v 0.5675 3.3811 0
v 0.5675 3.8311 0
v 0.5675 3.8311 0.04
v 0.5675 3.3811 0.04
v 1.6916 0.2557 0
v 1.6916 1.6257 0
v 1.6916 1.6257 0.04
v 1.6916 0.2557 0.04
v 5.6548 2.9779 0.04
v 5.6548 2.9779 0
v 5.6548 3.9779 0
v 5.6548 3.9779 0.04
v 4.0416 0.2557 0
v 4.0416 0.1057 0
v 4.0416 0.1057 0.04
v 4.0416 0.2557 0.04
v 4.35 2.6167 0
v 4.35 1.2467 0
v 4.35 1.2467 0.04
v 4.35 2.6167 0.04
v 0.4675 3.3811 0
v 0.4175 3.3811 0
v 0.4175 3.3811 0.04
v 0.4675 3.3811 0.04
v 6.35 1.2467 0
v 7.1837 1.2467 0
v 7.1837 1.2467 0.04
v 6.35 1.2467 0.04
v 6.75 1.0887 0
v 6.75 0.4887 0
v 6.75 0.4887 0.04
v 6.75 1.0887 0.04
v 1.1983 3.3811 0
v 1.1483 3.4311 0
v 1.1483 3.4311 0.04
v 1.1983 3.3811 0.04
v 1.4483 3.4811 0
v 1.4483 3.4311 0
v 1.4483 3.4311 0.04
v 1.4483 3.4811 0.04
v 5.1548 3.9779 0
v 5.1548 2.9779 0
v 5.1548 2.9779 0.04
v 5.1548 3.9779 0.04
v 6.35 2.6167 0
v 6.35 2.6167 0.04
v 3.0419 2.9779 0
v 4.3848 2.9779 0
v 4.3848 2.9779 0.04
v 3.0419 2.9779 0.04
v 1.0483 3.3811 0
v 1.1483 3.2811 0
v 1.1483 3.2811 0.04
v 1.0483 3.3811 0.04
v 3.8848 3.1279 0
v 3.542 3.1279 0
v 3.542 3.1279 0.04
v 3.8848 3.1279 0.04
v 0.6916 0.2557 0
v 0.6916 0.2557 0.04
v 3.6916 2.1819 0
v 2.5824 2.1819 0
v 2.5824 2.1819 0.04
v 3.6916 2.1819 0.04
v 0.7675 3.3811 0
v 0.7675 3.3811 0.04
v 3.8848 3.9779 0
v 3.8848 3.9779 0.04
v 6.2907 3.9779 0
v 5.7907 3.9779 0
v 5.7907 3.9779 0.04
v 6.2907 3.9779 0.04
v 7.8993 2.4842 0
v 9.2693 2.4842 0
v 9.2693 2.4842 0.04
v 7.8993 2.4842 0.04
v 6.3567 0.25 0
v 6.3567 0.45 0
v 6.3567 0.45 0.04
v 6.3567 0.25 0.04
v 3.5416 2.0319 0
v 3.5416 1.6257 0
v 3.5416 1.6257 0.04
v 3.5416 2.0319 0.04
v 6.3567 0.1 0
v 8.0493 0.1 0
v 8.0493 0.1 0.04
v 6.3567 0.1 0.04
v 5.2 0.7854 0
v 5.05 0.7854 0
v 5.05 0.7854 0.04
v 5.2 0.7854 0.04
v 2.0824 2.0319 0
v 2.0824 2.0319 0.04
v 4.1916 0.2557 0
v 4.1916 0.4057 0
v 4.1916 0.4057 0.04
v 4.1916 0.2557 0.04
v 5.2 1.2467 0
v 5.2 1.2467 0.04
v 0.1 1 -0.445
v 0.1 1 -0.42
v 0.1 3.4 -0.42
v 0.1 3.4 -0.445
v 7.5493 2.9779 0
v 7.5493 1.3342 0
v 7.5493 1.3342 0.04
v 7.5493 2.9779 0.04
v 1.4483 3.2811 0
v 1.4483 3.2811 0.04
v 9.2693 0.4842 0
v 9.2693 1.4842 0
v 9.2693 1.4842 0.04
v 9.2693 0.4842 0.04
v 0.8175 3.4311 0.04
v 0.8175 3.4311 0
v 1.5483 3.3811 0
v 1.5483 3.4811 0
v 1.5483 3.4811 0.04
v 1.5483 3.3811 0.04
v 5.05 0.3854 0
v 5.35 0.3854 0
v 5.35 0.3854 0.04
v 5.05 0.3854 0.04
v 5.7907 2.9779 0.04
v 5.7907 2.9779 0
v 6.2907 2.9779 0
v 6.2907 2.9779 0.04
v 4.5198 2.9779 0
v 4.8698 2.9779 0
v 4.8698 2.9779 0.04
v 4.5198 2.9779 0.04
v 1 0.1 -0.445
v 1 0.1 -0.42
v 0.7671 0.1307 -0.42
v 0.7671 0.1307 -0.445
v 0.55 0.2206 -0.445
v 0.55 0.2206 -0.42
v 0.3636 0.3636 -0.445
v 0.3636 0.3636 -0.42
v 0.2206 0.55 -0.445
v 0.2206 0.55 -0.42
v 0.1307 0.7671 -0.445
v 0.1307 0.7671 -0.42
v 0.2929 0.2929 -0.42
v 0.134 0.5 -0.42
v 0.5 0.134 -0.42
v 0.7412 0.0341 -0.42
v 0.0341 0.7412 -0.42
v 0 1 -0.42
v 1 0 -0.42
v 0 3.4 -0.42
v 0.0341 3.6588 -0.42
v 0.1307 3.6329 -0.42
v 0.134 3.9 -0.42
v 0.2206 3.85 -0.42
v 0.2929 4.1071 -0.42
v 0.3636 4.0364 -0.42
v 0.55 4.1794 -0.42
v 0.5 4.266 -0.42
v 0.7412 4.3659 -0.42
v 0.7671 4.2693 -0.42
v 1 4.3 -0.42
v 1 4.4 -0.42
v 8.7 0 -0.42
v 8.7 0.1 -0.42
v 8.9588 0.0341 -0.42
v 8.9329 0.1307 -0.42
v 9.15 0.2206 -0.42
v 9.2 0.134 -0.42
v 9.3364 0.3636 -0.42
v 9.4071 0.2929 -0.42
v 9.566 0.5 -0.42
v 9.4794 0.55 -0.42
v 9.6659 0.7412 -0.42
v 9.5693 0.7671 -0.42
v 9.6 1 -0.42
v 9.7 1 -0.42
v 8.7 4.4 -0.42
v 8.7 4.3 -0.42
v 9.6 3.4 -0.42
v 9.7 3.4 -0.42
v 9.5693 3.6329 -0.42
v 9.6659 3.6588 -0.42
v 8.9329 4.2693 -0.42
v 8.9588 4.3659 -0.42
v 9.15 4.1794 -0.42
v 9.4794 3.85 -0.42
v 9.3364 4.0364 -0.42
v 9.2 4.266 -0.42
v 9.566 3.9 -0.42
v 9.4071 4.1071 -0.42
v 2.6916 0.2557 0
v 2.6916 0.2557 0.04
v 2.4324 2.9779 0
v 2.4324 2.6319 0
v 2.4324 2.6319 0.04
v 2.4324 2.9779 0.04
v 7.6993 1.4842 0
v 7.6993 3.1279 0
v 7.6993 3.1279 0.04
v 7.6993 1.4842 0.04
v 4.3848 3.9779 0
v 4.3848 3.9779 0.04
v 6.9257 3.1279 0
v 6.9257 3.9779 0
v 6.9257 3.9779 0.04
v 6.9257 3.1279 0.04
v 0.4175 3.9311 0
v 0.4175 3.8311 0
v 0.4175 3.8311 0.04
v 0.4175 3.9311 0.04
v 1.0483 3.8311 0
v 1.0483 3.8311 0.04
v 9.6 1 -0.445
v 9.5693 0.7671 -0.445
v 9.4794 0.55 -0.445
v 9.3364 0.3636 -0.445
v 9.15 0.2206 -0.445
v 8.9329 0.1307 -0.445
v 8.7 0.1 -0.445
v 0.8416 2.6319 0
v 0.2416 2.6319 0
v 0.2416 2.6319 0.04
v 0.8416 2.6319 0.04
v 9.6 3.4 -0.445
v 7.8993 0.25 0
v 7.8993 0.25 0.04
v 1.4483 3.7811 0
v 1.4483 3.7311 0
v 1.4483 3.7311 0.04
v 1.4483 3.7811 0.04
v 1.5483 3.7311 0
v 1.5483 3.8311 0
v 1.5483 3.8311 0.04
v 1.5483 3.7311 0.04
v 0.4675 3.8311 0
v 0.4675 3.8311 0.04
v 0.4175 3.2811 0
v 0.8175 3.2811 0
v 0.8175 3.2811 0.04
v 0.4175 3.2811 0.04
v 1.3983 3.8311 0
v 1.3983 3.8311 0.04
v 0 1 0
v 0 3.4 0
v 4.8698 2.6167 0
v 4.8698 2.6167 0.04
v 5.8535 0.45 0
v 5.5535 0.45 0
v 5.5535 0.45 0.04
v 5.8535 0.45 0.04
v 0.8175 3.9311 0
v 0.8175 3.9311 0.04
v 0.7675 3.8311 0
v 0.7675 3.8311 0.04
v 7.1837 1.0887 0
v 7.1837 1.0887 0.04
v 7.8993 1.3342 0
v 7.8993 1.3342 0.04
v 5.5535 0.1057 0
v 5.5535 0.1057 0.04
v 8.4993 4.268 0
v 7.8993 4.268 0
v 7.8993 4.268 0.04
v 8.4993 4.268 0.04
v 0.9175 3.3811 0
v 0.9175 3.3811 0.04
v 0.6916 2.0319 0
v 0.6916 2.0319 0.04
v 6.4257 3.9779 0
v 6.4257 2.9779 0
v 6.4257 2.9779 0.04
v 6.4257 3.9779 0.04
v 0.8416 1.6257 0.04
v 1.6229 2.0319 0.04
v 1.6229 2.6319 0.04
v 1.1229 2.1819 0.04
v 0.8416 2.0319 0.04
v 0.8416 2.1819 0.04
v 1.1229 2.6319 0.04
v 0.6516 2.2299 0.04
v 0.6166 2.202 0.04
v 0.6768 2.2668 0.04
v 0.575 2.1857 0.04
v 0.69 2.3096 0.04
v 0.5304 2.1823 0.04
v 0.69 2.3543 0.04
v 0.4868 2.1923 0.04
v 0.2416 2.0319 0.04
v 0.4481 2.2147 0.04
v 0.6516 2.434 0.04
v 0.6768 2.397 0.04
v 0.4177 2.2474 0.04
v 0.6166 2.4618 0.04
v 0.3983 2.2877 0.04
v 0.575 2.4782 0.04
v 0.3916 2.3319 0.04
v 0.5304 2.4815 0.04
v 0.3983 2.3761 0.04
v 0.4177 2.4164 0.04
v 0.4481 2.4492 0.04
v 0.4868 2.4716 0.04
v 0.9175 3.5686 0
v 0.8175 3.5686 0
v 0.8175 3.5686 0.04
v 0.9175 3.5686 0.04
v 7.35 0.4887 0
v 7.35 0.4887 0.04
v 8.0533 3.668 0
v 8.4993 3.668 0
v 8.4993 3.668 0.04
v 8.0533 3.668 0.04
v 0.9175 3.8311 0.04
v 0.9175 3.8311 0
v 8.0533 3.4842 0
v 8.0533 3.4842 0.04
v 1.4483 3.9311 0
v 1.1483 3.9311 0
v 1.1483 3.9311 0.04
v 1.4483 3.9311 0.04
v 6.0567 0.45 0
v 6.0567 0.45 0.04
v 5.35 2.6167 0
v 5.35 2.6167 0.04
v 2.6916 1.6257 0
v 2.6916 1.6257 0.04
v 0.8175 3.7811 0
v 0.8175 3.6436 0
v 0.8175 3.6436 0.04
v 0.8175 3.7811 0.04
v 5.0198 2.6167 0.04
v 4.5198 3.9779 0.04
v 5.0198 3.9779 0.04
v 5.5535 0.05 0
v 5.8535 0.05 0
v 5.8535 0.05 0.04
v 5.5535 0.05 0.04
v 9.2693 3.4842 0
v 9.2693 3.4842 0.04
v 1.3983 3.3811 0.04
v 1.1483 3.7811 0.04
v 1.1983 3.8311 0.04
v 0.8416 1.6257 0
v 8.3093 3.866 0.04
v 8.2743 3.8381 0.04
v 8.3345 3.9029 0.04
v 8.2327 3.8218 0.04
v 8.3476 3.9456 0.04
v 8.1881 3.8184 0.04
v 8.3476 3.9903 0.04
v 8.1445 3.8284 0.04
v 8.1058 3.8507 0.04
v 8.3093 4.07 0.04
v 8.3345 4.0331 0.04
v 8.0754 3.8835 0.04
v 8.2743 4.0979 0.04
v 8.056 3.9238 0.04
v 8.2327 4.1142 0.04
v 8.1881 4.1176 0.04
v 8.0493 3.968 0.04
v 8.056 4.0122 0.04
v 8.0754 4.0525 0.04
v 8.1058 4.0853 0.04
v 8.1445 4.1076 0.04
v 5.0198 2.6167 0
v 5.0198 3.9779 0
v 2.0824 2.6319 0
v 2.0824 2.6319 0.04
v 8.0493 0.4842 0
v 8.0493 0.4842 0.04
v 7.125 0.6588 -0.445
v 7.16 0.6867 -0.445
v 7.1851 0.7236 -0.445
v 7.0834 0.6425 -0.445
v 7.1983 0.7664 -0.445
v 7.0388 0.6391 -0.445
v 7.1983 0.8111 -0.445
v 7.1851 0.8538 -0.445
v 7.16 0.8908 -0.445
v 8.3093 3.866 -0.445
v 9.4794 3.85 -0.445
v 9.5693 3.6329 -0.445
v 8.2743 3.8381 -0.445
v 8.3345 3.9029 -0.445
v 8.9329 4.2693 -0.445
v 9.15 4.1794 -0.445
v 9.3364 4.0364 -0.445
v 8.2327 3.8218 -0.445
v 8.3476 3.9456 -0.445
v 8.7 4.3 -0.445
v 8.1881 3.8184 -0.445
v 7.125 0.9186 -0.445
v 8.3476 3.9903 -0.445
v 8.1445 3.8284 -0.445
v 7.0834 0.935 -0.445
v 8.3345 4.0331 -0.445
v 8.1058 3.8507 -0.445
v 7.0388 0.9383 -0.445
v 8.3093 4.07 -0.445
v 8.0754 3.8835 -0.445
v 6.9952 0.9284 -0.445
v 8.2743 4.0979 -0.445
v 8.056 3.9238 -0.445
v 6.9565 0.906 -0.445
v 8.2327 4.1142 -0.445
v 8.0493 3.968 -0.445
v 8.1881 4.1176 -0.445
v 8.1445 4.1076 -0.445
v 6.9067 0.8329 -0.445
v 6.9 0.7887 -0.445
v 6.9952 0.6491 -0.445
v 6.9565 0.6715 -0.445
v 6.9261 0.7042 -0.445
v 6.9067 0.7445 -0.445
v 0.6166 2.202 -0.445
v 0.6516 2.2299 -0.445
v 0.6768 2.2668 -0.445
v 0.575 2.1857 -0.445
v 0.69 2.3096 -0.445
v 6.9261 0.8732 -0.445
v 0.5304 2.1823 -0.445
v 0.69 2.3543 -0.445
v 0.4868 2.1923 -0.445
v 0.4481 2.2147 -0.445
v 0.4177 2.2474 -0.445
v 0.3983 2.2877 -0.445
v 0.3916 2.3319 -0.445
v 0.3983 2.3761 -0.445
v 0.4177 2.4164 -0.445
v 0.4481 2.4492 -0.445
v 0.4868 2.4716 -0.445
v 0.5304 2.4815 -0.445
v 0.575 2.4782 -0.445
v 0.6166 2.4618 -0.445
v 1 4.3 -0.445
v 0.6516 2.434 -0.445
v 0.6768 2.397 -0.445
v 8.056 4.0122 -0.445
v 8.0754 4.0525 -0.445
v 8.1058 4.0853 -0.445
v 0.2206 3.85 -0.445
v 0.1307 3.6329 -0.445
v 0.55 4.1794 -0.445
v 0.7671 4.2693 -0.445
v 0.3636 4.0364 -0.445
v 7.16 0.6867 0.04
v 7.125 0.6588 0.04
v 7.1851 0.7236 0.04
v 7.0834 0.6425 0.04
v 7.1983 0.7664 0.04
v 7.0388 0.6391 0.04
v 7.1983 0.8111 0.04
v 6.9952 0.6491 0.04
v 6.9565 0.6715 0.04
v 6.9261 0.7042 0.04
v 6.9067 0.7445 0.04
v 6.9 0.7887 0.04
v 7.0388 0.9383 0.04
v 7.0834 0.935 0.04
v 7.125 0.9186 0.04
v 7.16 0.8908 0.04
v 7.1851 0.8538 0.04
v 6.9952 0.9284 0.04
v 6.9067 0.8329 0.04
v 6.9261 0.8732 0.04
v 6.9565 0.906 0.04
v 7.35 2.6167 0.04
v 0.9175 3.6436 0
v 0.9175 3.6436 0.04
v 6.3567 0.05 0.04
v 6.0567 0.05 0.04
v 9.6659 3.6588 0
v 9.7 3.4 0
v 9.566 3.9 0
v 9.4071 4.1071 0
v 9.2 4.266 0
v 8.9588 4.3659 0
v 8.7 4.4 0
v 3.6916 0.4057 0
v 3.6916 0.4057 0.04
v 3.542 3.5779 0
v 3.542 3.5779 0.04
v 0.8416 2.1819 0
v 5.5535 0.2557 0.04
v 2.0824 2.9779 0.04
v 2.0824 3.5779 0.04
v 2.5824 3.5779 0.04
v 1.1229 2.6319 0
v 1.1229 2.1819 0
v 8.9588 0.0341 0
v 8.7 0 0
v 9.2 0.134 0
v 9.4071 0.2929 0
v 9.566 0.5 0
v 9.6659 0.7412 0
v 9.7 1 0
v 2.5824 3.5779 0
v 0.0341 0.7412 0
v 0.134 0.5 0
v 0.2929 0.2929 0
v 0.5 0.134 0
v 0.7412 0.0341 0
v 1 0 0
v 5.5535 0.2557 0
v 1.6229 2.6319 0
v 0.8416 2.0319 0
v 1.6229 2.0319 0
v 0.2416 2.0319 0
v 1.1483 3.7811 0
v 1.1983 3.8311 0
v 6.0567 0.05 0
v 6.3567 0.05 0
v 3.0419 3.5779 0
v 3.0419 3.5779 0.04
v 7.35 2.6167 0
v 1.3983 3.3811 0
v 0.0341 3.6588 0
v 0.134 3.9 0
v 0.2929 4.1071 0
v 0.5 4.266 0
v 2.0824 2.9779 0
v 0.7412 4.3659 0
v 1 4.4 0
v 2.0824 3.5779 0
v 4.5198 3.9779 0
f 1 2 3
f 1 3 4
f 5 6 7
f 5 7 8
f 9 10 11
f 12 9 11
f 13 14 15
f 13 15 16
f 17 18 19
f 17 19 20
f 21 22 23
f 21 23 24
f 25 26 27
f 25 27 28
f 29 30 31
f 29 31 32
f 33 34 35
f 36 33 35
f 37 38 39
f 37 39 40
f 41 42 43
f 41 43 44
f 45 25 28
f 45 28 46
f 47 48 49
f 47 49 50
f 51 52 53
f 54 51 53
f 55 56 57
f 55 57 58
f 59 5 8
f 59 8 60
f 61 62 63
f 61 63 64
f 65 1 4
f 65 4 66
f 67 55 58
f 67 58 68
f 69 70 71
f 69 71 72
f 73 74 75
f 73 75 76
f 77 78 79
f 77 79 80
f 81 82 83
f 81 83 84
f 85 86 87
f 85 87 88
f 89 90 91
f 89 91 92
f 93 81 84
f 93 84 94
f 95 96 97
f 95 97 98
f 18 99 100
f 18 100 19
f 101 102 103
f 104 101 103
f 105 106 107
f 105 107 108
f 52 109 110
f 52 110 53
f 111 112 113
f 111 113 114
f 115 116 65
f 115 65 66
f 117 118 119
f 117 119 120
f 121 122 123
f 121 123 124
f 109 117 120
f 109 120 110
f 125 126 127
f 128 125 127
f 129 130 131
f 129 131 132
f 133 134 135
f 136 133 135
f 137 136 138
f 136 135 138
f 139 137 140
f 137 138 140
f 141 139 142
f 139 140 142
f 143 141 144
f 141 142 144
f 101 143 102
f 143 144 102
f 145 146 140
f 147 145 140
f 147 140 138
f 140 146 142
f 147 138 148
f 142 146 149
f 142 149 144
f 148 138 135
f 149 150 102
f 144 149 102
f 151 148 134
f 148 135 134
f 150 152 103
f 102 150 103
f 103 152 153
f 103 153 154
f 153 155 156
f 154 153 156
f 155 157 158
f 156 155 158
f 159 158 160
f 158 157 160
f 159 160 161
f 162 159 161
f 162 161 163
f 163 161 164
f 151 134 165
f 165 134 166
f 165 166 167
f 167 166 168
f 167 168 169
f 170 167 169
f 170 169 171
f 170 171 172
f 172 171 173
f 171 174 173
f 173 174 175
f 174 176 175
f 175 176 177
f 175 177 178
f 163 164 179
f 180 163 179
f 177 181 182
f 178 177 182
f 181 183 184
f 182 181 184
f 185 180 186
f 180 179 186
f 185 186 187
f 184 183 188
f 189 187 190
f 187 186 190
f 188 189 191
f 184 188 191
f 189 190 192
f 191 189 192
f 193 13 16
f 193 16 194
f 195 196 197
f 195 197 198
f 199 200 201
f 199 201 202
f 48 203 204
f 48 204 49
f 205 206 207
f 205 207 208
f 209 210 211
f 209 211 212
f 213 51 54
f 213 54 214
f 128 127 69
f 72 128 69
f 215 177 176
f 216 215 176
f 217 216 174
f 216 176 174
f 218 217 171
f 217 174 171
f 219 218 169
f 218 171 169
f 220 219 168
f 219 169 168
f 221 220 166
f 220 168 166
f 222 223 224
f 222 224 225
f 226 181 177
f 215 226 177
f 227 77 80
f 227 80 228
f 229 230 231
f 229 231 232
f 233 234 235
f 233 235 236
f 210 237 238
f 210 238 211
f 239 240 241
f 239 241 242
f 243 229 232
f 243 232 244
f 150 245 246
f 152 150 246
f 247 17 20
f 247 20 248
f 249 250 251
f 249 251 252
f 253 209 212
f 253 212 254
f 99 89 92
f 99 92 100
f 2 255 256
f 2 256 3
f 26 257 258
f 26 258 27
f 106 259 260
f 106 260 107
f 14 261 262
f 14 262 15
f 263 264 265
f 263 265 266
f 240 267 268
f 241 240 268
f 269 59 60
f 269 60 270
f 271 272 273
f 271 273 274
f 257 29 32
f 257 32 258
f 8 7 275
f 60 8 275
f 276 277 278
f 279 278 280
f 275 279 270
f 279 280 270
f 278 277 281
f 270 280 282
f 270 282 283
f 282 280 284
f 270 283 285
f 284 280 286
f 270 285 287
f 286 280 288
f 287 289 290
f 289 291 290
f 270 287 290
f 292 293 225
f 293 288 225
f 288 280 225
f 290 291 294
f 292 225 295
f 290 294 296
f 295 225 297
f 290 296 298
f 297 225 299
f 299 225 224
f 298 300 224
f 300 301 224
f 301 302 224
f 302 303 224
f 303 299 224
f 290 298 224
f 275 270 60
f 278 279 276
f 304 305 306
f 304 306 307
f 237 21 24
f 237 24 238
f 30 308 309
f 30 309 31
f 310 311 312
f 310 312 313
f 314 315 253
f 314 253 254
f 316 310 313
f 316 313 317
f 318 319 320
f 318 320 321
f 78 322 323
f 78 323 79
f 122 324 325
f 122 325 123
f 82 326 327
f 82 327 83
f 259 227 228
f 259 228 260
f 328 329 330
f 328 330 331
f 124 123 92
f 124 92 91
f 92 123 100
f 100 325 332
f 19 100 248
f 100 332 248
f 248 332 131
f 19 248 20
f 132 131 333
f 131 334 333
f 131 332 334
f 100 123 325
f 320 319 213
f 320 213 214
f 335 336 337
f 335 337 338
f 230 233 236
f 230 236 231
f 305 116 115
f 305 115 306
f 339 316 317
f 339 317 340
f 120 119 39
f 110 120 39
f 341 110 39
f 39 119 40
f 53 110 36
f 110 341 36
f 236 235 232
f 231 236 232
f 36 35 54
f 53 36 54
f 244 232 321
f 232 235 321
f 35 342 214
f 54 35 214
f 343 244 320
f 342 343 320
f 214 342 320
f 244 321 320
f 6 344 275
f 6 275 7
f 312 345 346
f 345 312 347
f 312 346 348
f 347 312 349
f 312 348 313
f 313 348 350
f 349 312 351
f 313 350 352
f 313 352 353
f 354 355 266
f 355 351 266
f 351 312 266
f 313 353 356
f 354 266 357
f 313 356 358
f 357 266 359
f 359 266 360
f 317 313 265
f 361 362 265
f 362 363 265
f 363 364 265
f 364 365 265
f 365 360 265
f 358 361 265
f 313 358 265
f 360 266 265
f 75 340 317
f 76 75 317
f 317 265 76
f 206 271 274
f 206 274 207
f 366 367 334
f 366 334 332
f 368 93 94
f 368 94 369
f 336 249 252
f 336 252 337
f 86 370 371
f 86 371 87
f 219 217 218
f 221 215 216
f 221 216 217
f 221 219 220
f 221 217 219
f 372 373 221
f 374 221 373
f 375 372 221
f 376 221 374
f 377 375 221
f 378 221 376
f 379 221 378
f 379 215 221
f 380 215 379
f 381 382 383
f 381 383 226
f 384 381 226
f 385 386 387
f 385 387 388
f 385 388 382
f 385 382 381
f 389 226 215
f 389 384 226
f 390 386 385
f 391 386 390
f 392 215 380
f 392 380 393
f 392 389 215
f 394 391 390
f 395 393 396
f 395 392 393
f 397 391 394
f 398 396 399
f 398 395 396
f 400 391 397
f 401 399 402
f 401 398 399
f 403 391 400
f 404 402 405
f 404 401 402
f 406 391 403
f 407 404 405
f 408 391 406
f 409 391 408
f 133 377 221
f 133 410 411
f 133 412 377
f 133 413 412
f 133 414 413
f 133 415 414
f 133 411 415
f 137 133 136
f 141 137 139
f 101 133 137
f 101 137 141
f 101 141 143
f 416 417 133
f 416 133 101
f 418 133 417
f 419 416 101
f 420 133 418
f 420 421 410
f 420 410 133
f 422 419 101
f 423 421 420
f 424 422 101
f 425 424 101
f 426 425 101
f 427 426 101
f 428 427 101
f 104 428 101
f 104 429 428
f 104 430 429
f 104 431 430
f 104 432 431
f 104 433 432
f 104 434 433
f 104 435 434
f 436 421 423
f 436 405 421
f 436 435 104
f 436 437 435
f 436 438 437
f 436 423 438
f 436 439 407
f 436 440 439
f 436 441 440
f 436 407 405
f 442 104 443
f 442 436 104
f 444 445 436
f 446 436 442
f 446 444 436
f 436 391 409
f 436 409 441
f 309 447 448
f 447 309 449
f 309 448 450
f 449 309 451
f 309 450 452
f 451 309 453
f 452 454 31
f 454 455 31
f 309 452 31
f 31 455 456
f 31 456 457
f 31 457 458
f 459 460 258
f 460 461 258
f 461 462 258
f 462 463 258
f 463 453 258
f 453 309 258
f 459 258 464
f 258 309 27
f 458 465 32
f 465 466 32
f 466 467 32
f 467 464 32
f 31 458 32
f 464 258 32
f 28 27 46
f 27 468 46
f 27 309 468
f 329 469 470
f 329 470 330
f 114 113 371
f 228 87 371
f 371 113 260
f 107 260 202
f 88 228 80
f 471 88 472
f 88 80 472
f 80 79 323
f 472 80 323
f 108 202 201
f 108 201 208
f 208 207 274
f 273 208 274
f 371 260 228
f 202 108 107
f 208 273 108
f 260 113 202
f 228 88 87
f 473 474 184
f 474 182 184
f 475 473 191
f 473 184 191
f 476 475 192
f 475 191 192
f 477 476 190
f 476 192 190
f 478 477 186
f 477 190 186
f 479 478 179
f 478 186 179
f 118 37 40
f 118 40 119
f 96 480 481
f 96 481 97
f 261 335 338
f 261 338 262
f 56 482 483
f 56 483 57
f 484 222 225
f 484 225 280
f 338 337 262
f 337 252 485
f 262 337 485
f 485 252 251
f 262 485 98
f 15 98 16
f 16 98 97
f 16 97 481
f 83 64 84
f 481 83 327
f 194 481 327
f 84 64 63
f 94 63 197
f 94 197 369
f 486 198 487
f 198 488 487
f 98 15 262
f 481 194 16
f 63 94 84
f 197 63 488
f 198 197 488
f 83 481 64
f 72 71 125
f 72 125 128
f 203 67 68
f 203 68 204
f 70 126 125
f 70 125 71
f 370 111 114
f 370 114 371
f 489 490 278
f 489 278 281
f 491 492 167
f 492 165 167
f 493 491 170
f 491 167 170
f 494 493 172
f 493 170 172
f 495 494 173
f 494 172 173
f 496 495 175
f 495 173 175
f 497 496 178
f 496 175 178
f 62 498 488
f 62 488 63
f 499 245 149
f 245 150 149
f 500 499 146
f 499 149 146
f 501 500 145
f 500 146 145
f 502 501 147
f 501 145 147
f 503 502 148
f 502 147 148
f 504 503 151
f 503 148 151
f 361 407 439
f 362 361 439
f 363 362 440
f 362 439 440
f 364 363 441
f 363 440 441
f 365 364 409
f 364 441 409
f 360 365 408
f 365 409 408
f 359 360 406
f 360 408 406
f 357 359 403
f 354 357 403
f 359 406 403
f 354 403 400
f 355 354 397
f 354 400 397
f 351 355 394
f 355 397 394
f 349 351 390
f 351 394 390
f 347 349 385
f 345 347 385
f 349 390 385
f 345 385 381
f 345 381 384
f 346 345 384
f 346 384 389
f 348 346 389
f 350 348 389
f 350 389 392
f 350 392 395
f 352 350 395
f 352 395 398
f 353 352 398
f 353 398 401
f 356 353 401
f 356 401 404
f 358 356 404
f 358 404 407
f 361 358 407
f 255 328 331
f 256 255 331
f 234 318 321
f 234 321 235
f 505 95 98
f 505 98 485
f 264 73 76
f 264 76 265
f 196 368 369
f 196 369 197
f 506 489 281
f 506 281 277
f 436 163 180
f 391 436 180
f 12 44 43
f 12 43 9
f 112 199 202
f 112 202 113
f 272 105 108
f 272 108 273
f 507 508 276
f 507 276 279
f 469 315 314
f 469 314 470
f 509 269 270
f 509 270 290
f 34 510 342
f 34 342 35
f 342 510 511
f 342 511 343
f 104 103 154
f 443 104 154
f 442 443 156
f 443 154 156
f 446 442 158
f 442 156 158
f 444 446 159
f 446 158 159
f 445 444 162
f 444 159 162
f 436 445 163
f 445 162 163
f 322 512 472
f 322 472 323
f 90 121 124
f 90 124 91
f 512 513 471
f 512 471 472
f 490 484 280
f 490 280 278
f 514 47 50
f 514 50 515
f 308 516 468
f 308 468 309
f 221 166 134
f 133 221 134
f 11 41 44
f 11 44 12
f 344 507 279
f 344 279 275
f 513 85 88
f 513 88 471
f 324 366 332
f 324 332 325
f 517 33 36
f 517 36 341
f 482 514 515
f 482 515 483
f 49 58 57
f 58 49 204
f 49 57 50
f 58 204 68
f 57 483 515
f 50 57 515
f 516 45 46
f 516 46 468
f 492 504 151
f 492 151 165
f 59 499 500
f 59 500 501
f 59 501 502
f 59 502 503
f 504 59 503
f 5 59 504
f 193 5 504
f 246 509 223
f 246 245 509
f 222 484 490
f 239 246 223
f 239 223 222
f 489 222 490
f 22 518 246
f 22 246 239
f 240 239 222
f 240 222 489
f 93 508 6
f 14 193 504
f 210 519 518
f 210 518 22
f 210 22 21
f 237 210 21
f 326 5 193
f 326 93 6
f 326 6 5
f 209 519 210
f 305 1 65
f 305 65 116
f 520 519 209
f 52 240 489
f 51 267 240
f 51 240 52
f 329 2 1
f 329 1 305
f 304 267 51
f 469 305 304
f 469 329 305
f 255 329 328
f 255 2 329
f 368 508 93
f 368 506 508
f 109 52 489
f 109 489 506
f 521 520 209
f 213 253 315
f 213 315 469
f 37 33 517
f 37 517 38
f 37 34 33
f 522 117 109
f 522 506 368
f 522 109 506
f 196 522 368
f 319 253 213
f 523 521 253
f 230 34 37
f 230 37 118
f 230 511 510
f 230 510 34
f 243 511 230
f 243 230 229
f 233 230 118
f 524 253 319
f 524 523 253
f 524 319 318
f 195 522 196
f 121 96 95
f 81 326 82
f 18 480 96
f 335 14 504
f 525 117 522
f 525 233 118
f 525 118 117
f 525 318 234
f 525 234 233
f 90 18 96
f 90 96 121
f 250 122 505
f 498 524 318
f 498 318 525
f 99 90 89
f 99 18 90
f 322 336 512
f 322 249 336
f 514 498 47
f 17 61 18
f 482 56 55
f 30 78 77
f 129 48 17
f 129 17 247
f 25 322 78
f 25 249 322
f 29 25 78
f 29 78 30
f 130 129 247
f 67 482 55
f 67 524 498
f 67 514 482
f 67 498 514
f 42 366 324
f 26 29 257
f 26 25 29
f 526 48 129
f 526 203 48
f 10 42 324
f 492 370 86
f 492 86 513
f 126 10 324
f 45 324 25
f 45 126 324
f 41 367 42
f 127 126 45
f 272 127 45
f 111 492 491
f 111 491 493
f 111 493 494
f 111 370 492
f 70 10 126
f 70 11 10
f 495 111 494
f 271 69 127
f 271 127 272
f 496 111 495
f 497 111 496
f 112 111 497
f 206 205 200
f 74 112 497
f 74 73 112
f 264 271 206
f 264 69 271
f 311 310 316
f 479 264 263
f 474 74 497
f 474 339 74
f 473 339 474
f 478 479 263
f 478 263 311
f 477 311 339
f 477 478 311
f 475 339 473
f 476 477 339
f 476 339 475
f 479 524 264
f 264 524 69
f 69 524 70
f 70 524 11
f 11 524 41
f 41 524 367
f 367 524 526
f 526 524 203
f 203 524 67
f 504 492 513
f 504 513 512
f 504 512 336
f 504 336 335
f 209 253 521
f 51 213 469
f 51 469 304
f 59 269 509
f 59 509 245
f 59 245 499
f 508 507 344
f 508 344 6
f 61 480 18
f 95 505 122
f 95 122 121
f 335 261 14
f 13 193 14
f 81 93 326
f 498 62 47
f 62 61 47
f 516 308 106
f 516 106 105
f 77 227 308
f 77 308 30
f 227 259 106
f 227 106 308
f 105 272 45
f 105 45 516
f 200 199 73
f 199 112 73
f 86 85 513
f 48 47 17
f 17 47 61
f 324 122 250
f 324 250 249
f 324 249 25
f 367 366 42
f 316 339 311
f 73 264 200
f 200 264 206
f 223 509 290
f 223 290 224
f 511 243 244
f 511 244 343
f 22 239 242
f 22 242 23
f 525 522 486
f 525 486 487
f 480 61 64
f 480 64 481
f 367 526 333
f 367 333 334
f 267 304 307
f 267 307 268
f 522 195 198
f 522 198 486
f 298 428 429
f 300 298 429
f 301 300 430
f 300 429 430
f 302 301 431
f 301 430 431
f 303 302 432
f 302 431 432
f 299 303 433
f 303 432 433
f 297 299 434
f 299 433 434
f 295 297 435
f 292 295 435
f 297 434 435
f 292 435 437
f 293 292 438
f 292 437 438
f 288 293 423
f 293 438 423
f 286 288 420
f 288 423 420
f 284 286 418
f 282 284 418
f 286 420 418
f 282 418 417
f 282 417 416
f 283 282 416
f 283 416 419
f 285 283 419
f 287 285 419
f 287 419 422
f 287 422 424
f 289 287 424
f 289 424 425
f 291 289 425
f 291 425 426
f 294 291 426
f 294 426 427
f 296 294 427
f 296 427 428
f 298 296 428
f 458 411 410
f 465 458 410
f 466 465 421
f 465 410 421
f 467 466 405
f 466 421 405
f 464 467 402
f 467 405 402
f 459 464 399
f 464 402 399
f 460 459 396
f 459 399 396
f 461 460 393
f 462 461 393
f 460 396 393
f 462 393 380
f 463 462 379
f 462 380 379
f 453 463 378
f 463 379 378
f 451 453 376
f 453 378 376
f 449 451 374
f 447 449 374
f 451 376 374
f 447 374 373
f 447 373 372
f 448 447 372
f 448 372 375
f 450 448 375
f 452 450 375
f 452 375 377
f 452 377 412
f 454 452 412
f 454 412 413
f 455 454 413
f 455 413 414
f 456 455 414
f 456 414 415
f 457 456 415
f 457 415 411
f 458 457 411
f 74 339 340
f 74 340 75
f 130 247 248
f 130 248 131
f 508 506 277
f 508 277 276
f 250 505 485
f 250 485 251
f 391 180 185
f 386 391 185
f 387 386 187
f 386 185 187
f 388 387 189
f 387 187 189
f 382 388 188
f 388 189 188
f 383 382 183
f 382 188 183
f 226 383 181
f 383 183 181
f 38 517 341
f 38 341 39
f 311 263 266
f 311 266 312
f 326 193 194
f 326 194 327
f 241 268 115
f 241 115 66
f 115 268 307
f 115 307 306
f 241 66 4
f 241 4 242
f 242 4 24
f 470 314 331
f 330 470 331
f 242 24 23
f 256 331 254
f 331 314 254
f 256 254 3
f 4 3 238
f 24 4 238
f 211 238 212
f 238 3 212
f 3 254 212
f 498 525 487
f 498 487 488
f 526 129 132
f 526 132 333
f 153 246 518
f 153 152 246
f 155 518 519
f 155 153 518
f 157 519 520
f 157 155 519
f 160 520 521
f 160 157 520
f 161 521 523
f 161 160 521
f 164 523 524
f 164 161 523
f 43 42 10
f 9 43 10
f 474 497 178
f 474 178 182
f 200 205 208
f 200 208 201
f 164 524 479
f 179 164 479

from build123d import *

# Parameters (mm, degrees)
SKETCH1_W            = 9.7
SKETCH1_H            = 4.4
BOSS_EXTRUDE1_DEPTH  = 0.42
FILLET1_R            = 1
FILLET2_R            = 1
FILLET3_R            = 1
FILLET4_R            = 1
BOSS_EXTRUDE2_DEPTH  = 0.04
BOSS_EXTRUDE3_DEPTH  = 0.04
BOSS_EXTRUDE4_DEPTH  = 0.04
BOSS_EXTRUDE5_DEPTH  = 0.04
BOSS_EXTRUDE6_DEPTH  = 0.04
BOSS_EXTRUDE7_DEPTH  = 0.04
BOSS_EXTRUDE8_DEPTH  = 0.04
BOSS_EXTRUDE9_DEPTH  = 0.04
BOSS_EXTRUDE10_DEPTH = 0.04
SKETCH11_W           = 0.5
SKETCH11_H           = 1
BOSS_EXTRUDE11_DEPTH = 0.04
SKETCH12_W           = 0.5
SKETCH12_H           = 1
BOSS_EXTRUDE12_DEPTH = 0.04
BOSS_EXTRUDE13_DEPTH = 0.025
HOLE1_D              = 0.3
HOLE2_D              = 0.3
HOLE3_D              = 0.3
CHAMFER1_SIZE        = 0.1
CHAMFER2_SIZE        = 0.05
CHAMFER3_SIZE        = 0.1
CHAMFER4_SIZE        = 0.05
CHAMFER5_SIZE        = 0.1
CHAMFER6_SIZE        = 0.1
CHAMFER7_SIZE        = 0.05
CHAMFER8_SIZE        = 0.05


with BuildPart() as part:
    # Sketch1 → Boss-Extrude1 (new body)
    with BuildSketch(Plane.XY):
        with Locations((4.849999999, 2.20000002)):
            Rectangle(SKETCH1_W, SKETCH1_H)
    extrude(amount=-BOSS_EXTRUDE1_DEPTH)

    # Fillet1
    fillet1_edges = [part.edges().sort_by_distance(p)[0] for p in [
        (-1e-09, 2e-08, -0.21),
    ]]
    fillet(fillet1_edges, radius=FILLET1_R)

    # Fillet2
    fillet2_edges = [part.edges().sort_by_distance(p)[0] for p in [
        (-1e-09, 4.40000002, -0.21),
    ]]
    fillet(fillet2_edges, radius=FILLET2_R)

    # Fillet3
    fillet3_edges = [part.edges().sort_by_distance(p)[0] for p in [
        (9.699999999, 2e-08, -0.21),
    ]]
    fillet(fillet3_edges, radius=FILLET3_R)

    # Fillet4
    fillet4_edges = [part.edges().sort_by_distance(p)[0] for p in [
        (9.699999999, 4.40000002, -0.21),
    ]]
    fillet(fillet4_edges, radius=FILLET4_R)

    # Sketch2 → Boss-Extrude2 (add)
    with BuildSketch(Plane.XY):
        Polygon((3.691646515, 0.405675456), (4.19162877, 0.405675456), (4.19162877, 0.255675455), (5.553515055, 0.255675455), (5.553515055, 0.45000002), (5.853515055, 0.45000002), (5.853515055, 0.05000002), (5.553515055, 0.05000002), (5.553515055, 0.105675455), (4.04162877, 0.105675455), (4.04162877, 0.255675455), (2.69162877, 0.255675455), (2.69162877, 1.625675455), (3.54162877, 1.625675455), (3.54162877, 2.031926109), (2.082430938, 2.031926109), (2.082430938, 2.631926109), (2.432448683, 2.631926109), (2.432448683, 2.97790002), (2.082448683, 2.97790002), (2.082448683, 3.57790002), (2.582448683, 3.57790002), (2.582448683, 2.181926109), (3.691646515, 2.181926109), align=None)
    extrude(amount=BOSS_EXTRUDE2_DEPTH)

    # Sketch3 → Boss-Extrude3 (add)
    with BuildSketch(Plane.XY):
        Polygon((6.356700213, 0.05000002), (6.056700213, 0.05000002), (6.056700213, 0.45000002), (6.356700213, 0.45000002), (6.356700213, 0.25000002), (7.899307242, 0.25000002), (7.899307242, 1.334176783), (7.549307242, 1.334176783), (7.549307242, 2.97790002), (6.425655767, 2.97790002), (6.425655767, 3.97790002), (6.925655767, 3.97790002), (6.925655767, 3.12790002), (7.699307242, 3.12790002), (7.699307242, 1.484176783), (9.269307242, 1.484176783), (9.269307242, 0.484176783), (8.049307242, 0.484176783), (8.049307242, 0.10000002), (6.356700213, 0.10000002), align=None)
    extrude(amount=BOSS_EXTRUDE3_DEPTH)

    # Sketch4 → Boss-Extrude4 (add)
    with BuildSketch(Plane.XY):
        Polygon((1.148250377, 3.831121862), (1.148250377, 3.381121862), (1.398250377, 3.381121862), (1.448250377, 3.431121862), (1.448250377, 3.481121862), (1.548250377, 3.481121862), (1.548250377, 3.381121862), (1.448250377, 3.281121862), (1.048250377, 3.281121862), (1.048250377, 3.931121862), (1.448250377, 3.931121862), (1.548250377, 3.831121862), (1.548250377, 3.731121862), (1.448250377, 3.731121862), (1.448250377, 3.781121862), (1.398250377, 3.831121862), align=None)
    extrude(amount=BOSS_EXTRUDE4_DEPTH)

    # Sketch5 → Boss-Extrude5 (add)
    with BuildSketch(Plane.XY):
        Polygon((0.417468966, 3.281121862), (0.417468966, 3.381121862), (0.467468966, 3.381121862), (0.467468966, 3.831121862), (0.417468966, 3.831121862), (0.417468966, 3.931121862), (0.917468966, 3.931121862), (0.917468966, 3.643621862), (0.817468966, 3.643621862), (0.817468966, 3.831121862), (0.567468966, 3.831121862), (0.567468966, 3.381121862), (0.817468966, 3.381121862), (0.817468966, 3.568621862), (0.917468966, 3.568621862), (0.917468966, 3.281121862), align=None)
    extrude(amount=BOSS_EXTRUDE5_DEPTH)

    # Sketch6 → Boss-Extrude6 (add)
    with BuildSketch(Plane.XY):
        Polygon((5.349999999, 0.385416863), (5.049999999, 0.385416863), (5.049999999, 0.785416863), (5.199999999, 0.785416863), (5.199999999, 1.246726542), (4.349999999, 1.246726542), (4.349999999, 2.616726542), (4.869837207, 2.616726542), (4.869837207, 2.97790002), (4.519837207, 2.97790002), (4.519837207, 3.97790002), (5.019837207, 3.97790002), (5.019837207, 2.616726542), (5.349999999, 2.616726542), align=None)
    extrude(amount=BOSS_EXTRUDE6_DEPTH)

    # Sketch7 → Boss-Extrude7 (add)
    with BuildSketch(Plane.XY):
        Polygon((1.691646515, 1.625675456), (1.691646515, 0.255675456), (0.691646515, 0.255675456), (0.691646515, 2.031926109), (0.241646515, 2.031926109), (0.241646515, 2.631926109), (0.841646515, 2.631926109), (0.841646515, 2.181926109), (1.122933895, 2.181926109), (1.122933895, 2.631926109), (1.622933895, 2.631926109), (1.622933895, 2.031926109), (0.841646515, 2.031926109), (0.841646515, 1.625675456), align=None)
    extrude(amount=BOSS_EXTRUDE7_DEPTH)

    # Sketch8 → Boss-Extrude8 (add)
    with BuildSketch(Plane.XY):
        Polygon((3.54196347, 3.57790002), (3.54196347, 3.12790002), (3.884837207, 3.12790002), (3.884837207, 3.97790002), (4.384819462, 3.97790002), (4.384819462, 2.97790002), (3.041945725, 2.97790002), (3.041945725, 3.57790002), align=None)
    extrude(amount=BOSS_EXTRUDE8_DEPTH)

    # Sketch9 → Boss-Extrude9 (add)
    with BuildSketch(Plane.XY):
        Polygon((6.749999999, 1.088728228), (7.183722976, 1.088728228), (7.183722976, 1.246726542), (6.349999999, 1.246726542), (6.349999999, 2.616726542), (7.349999999, 2.616726542), (7.349999999, 0.488728228), (6.749999999, 0.488728228), align=None)
    extrude(amount=BOSS_EXTRUDE9_DEPTH)

    # Sketch10 → Boss-Extrude10 (add)
    with BuildSketch(Plane.XY):
        Polygon((8.499307242, 3.667992872), (8.053251319, 3.667992872), (8.053251319, 3.484176783), (9.269307242, 3.484176783), (9.269307242, 2.484176783), (7.899307242, 2.484176783), (7.899307242, 4.267992872), (8.499307242, 4.267992872), align=None)
    extrude(amount=BOSS_EXTRUDE10_DEPTH)

    # Sketch11 → Boss-Extrude11 (add)
    with BuildSketch(Plane.XY):
        with Locations((5.404837207, 3.47790002)):
            Rectangle(SKETCH11_W, SKETCH11_H)
    extrude(amount=BOSS_EXTRUDE11_DEPTH)

    # Sketch12 → Boss-Extrude12 (add)
    with BuildSketch(Plane.XY):
        with Locations((6.040655767, 3.47790002)):
            Rectangle(SKETCH12_W, SKETCH12_H)
    extrude(amount=BOSS_EXTRUDE12_DEPTH)

    # Sketch19 → Boss-Extrude13 (add)
    with BuildSketch(Plane(origin=(0, 0, -0.42), x_dir=(-1, 0, 0), z_dir=(0, 0, -1))):
        with BuildLine():
            Line((-0.999999999, 4.30000002), (-8.699999999, 4.30000002))
            ThreePointArc((-8.699999999, 4.30000002), (-9.336396102, 4.036396123), (-9.599999999, 3.40000002))
            Line((-9.599999999, 3.40000002), (-9.599999999, 1.00000002))
            ThreePointArc((-9.599999999, 1.00000002), (-9.336396102, 0.363603917), (-8.699999999, 0.10000002))
            Line((-8.699999999, 0.10000002), (-0.999999999, 0.10000002))
            ThreePointArc((-0.999999999, 0.10000002), (-0.363603896, 0.363603917), (-0.099999999, 1.00000002))
            Line((-0.099999999, 1.00000002), (-0.099999999, 3.40000002))
            ThreePointArc((-0.099999999, 3.40000002), (-0.363603896, 4.036396123), (-0.999999999, 4.30000002))
        make_face()
    extrude(amount=BOSS_EXTRUDE13_DEPTH)

    # Hole1 (through all)
    with Locations(Plane.XY.offset(0.04)):
        with Locations((8.199307242, 3.967992872)):
            Hole(HOLE1_D / 2)

    # Hole2 (through all)
    with Locations(Plane.XY.offset(0.04)):
        with Locations((7.049999999, 0.788728228)):
            Hole(HOLE2_D / 2)

    # Hole3 (through all)
    with Locations(Plane.XY.offset(0.04)):
        with Locations((0.541646515, 2.331926109)):
            Hole(HOLE3_D / 2)

    # Chamfer1
    chamfer1_edges = [part.edges().sort_by_distance(p)[0] for p in [
        (0.917468966, 3.931121862, 0.02),
    ]]
    chamfer(chamfer1_edges, length=CHAMFER1_SIZE)

    # Chamfer2
    chamfer2_edges = [part.edges().sort_by_distance(p)[0] for p in [
        (1.148250377, 3.831121862, 0.02),
    ]]
    chamfer(chamfer2_edges, length=CHAMFER2_SIZE)

    # Chamfer3
    chamfer3_edges = [part.edges().sort_by_distance(p)[0] for p in [
        (0.917468966, 3.281121862, 0.02),
    ]]
    chamfer(chamfer3_edges, length=CHAMFER3_SIZE)

    # Chamfer4
    chamfer4_edges = [part.edges().sort_by_distance(p)[0] for p in [
        (0.817468966, 3.831121862, 0.02),
    ]]
    chamfer(chamfer4_edges, length=CHAMFER4_SIZE)

    # Chamfer5
    chamfer5_edges = [part.edges().sort_by_distance(p)[0] for p in [
        (1.048250377, 3.281121862, 0.02),
    ]]
    chamfer(chamfer5_edges, length=CHAMFER5_SIZE)

    # Chamfer6
    chamfer6_edges = [part.edges().sort_by_distance(p)[0] for p in [
        (1.048250377, 3.931121862, 0.02),
    ]]
    chamfer(chamfer6_edges, length=CHAMFER6_SIZE)

    # Chamfer7
    chamfer7_edges = [part.edges().sort_by_distance(p)[0] for p in [
        (1.148250377, 3.381121862, 0.02),
    ]]
    chamfer(chamfer7_edges, length=CHAMFER7_SIZE)

    # Chamfer8
    chamfer8_edges = [part.edges().sort_by_distance(p)[0] for p in [
        (0.817468966, 3.381121862, 0.02),
    ]]
    chamfer(chamfer8_edges, length=CHAMFER8_SIZE)


solid = part.part
